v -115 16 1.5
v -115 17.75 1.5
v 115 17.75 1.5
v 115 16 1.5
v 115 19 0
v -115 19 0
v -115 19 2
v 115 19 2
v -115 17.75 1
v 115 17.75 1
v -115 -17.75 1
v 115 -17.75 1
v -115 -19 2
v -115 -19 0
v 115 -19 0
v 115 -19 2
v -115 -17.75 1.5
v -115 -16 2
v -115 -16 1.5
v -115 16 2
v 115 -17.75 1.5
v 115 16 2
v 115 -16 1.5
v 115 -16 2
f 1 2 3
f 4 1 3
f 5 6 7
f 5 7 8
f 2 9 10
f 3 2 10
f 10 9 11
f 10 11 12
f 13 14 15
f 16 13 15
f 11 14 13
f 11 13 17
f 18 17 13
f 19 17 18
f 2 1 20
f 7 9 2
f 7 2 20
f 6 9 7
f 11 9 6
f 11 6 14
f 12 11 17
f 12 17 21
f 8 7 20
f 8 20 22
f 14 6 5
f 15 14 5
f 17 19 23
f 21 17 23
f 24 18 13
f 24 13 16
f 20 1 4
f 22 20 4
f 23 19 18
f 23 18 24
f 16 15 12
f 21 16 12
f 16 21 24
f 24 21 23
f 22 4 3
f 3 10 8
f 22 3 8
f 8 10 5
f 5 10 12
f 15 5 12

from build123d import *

# Parameters (mm, degrees)
F0_W     = 230
F0_H     = 38
F1_DEPTH = 1
F2_W     = 230
F2_H     = 1.25
F3_DEPTH = 0.5
F4_W     = 230
F4_H     = 3
F5_DEPTH = 0.5


with BuildPart() as f1:
    # F0 (on Top) → F1 (new body)
    with BuildSketch(Plane.XY):
        Rectangle(F0_W, F0_H)
    extrude(amount=F1_DEPTH)

    # F2 (on face) → F3 (join)
    with BuildSketch(Plane.XY.offset(1)):
        with Locations((0, 18.375)):
            Rectangle(F2_W, F2_H)
        with Locations((0, -18.375)):
            Rectangle(F2_W, F2_H)
    extrude(amount=F3_DEPTH)

    # F4 (on face) → F5 (join)
    with BuildSketch(Plane.XY.offset(1.5)):
        with Locations((0, 17.5)):
            Rectangle(F4_W, F4_H)
        with Locations((0, -17.5)):
            Rectangle(F4_W, F4_H)
    extrude(amount=F5_DEPTH)


solid = f1.part
